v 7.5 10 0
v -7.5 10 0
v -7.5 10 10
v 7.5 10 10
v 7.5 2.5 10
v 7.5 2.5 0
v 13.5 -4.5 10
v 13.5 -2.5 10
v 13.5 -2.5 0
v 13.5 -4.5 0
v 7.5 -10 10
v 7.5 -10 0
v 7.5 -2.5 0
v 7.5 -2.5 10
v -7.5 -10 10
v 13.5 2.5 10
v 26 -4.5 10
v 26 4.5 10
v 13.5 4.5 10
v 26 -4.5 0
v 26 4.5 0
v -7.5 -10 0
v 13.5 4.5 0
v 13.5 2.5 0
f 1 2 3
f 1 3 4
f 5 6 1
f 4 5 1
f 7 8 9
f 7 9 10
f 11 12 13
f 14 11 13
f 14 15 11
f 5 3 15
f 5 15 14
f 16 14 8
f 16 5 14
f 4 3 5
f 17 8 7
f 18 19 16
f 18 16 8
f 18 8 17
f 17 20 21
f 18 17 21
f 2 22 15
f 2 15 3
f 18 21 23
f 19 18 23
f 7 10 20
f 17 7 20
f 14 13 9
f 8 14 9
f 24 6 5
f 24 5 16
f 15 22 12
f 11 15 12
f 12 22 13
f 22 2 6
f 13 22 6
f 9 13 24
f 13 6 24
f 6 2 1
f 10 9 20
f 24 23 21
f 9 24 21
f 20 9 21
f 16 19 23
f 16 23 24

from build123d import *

# Parameters (mm, degrees)
SKETCH1_W           = 15
SKETCH1_H           = 20
SKETCH1_W_2         = 6
SKETCH1_H_2         = 5
BOSS_EXTRUDE1_DEPTH = 10


with BuildPart() as part:
    # Sketch1 → Boss-Extrude1 (new body)
    with BuildSketch(Plane.XY):
        Rectangle(SKETCH1_W, SKETCH1_H)
        with Locations((10.5, 0)):
            Rectangle(SKETCH1_W_2, SKETCH1_H_2)
        Polygon((13.5, 2.5), (13.5, -2.5), (13.5, -4.5), (26, -4.5), (26, 4.5), (13.5, 4.5), align=None)
    extrude(amount=BOSS_EXTRUDE1_DEPTH)


solid = part.part
